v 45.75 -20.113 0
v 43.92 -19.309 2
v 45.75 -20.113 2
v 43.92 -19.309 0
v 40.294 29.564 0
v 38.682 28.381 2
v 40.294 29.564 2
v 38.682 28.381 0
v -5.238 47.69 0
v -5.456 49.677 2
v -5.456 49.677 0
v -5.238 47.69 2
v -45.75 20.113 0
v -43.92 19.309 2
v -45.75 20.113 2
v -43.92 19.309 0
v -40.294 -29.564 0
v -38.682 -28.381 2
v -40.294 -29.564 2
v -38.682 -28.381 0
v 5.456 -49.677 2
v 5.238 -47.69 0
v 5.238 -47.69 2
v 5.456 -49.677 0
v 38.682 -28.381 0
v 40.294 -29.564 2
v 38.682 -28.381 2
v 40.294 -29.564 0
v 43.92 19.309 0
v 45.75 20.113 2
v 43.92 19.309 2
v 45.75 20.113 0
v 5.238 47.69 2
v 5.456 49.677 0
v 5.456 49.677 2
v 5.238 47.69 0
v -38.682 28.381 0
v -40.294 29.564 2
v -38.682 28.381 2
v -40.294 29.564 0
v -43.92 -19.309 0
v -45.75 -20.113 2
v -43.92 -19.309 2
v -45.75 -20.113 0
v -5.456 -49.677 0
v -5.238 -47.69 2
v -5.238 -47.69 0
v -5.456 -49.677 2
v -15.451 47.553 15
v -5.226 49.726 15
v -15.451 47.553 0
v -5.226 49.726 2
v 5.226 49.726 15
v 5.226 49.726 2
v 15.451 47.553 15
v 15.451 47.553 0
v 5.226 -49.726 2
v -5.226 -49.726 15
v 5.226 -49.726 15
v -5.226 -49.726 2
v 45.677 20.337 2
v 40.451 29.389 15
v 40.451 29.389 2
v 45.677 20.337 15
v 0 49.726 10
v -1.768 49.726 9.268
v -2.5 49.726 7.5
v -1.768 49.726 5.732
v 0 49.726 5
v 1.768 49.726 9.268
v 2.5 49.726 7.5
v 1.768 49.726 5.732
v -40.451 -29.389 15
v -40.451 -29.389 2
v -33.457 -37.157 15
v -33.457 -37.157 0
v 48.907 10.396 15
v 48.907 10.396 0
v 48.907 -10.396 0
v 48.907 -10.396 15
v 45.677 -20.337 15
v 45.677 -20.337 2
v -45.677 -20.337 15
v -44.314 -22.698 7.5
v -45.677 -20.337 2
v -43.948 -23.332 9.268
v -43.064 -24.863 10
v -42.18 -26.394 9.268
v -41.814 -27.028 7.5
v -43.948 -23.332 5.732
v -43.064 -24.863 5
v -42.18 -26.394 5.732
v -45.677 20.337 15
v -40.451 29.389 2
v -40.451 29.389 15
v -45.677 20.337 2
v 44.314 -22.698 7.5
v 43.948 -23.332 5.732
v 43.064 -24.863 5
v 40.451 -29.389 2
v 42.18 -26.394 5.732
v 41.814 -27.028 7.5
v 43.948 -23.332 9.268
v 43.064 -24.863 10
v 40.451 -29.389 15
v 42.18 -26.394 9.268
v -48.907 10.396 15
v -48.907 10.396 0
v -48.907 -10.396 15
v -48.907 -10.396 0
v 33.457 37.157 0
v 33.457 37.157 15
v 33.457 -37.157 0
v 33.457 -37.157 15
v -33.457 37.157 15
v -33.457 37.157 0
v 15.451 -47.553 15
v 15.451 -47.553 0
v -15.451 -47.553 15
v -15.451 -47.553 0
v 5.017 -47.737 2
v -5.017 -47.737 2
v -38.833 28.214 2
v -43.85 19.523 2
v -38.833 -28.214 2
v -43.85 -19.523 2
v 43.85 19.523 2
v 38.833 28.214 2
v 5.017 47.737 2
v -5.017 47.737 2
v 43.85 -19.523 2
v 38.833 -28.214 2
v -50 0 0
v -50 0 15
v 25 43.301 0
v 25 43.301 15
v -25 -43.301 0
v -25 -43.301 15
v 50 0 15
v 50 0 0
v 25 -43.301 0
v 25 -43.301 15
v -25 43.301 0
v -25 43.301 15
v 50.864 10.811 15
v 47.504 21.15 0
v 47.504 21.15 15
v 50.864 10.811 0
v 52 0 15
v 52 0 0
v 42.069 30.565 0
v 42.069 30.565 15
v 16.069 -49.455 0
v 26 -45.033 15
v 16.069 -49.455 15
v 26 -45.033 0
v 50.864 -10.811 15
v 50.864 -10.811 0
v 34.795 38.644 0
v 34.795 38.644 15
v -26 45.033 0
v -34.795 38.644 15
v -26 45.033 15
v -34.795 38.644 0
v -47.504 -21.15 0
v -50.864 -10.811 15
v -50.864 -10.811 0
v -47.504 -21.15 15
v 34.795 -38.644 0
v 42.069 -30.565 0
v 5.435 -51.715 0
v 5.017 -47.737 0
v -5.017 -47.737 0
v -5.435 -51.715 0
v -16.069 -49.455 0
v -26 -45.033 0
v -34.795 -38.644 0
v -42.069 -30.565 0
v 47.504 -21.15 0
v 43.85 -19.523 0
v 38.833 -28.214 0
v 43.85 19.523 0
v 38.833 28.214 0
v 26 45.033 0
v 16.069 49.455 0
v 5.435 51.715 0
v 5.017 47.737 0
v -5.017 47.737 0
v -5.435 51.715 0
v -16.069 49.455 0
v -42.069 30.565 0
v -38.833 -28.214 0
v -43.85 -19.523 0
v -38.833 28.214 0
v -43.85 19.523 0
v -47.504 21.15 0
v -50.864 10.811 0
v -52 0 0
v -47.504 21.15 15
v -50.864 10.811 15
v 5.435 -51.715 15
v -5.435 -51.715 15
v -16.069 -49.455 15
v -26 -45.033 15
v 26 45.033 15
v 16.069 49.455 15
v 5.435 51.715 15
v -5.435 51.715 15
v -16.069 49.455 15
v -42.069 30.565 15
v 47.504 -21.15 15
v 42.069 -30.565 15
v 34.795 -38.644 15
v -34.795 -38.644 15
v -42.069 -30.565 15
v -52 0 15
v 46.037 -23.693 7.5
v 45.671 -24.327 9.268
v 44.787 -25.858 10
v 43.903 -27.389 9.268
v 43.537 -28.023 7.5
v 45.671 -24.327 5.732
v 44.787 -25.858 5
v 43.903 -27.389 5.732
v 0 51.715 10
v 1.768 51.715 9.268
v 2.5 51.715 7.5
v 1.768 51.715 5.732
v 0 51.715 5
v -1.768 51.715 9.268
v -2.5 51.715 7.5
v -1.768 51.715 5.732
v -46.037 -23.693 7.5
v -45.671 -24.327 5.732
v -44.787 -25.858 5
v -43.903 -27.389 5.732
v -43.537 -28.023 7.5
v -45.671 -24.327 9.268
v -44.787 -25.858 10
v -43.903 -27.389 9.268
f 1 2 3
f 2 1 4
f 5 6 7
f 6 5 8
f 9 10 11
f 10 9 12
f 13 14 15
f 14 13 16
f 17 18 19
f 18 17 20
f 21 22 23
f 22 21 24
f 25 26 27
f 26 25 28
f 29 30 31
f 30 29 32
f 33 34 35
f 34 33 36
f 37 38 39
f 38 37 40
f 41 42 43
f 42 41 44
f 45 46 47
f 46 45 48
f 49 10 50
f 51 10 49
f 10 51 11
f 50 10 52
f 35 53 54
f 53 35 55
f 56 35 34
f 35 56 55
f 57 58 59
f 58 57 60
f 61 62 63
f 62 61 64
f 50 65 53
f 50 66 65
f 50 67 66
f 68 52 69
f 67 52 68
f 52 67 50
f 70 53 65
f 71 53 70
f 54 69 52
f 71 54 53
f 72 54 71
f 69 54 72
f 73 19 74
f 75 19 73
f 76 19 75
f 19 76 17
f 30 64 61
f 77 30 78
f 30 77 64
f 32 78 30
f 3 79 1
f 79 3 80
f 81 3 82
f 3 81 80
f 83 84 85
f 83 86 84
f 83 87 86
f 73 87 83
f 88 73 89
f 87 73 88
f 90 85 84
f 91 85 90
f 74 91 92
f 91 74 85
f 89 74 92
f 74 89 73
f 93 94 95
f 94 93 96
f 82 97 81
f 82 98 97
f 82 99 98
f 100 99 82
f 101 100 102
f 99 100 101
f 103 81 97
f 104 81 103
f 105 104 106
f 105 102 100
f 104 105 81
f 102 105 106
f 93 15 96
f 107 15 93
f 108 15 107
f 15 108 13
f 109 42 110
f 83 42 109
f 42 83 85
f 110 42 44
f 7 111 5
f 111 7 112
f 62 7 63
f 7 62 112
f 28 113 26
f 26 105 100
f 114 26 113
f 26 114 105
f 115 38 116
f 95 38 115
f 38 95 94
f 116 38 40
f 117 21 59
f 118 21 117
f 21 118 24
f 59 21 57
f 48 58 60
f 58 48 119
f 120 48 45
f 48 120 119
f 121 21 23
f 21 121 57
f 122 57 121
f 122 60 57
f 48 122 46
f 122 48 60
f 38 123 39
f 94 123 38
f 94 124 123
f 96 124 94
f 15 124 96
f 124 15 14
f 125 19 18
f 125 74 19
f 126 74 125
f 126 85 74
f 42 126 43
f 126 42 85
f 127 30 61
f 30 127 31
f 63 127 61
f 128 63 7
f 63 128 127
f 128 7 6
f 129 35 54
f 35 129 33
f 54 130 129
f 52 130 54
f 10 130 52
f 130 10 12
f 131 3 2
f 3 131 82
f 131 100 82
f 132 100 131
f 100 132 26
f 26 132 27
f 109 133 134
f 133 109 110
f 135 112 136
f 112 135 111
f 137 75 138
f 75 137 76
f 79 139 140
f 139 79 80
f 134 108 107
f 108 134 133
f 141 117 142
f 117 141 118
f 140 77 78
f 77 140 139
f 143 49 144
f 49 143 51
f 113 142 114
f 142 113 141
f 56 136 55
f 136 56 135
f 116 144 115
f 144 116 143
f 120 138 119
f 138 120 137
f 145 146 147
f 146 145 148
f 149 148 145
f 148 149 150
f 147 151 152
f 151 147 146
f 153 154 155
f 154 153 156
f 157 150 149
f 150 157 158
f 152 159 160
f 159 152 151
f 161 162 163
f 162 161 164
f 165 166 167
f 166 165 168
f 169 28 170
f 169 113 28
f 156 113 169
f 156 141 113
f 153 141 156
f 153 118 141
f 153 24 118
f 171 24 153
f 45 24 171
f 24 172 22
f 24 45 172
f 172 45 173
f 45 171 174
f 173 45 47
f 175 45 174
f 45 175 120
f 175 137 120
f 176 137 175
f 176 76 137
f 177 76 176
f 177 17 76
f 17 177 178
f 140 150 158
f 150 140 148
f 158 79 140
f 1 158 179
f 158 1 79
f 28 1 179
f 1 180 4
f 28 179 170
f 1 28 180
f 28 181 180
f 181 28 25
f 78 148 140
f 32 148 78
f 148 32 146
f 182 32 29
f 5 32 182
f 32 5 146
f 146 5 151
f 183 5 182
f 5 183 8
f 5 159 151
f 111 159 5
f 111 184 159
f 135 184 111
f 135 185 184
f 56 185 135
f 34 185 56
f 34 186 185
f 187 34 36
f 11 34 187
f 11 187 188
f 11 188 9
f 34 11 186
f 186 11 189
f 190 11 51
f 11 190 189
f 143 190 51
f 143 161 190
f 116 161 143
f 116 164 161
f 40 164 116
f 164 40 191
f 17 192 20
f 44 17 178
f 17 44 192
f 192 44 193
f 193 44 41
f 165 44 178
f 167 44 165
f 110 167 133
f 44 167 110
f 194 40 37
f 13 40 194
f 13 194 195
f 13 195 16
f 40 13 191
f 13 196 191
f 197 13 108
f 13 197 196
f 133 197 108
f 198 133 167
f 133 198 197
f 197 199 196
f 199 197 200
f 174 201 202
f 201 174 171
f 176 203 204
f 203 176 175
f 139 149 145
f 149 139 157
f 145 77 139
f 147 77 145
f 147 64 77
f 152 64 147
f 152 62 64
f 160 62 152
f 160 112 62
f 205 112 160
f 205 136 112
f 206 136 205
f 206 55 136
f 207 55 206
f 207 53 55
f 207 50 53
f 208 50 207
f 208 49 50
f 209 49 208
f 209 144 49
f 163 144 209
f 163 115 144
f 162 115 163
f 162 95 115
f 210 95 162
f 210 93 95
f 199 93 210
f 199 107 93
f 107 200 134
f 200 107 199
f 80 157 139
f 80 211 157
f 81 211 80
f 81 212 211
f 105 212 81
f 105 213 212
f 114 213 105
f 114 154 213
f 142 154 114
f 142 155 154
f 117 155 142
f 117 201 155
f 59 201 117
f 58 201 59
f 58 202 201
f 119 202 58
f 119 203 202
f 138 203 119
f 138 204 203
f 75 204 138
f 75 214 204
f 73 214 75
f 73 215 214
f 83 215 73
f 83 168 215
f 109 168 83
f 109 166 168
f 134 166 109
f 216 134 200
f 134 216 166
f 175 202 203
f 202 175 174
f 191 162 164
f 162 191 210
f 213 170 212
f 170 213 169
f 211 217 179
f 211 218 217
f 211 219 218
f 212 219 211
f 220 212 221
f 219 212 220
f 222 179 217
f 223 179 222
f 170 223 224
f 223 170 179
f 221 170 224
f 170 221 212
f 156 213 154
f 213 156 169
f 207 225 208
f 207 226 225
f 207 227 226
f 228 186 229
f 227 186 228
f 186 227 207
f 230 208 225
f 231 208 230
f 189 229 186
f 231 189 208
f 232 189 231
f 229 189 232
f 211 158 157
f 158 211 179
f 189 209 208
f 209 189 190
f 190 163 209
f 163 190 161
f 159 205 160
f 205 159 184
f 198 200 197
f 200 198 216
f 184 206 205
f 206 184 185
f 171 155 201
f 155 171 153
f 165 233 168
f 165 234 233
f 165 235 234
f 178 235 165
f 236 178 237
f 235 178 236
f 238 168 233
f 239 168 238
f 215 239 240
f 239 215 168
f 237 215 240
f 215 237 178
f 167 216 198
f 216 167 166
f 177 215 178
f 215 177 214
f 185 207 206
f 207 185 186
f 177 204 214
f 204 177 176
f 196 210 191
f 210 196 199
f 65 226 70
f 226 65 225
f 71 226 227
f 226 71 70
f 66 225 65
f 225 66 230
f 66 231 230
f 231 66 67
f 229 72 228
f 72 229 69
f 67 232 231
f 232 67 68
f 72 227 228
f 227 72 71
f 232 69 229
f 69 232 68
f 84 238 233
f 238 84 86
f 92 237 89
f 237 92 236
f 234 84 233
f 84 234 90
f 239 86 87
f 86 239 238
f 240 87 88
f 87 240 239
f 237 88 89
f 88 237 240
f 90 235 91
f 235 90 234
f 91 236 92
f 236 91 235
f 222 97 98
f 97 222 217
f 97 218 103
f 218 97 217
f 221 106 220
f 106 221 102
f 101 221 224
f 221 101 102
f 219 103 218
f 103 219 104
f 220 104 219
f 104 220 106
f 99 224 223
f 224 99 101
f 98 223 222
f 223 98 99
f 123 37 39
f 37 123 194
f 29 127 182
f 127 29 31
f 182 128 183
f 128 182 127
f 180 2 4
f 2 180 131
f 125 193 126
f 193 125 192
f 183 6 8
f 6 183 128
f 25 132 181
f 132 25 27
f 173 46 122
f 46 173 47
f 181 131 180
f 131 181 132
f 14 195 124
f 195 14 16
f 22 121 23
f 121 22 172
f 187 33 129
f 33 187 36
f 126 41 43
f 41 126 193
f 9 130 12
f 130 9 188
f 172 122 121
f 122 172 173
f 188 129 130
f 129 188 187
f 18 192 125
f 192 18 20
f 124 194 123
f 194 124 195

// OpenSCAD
baseThick = 2;
baseWidth = 4;
baseOuterDiameter = 104;
baseInnerDiameter = baseOuterDiameter - (baseWidth * 2);

wallHeight = 15;
wallThick = 4;
chamberDiameter = 100;

partHeight = wallHeight;
partWidth = baseOuterDiameter;

use <MCAD/gears.scad>

union() {

    difference() {

        difference() {
            cylinder(h = wallHeight, d = baseOuterDiameter);

            translate([0,0,-1]) {
                difference() {
                    cylinder(h = baseThick + 2, d = baseOuterDiameter - wallThick);

                    difference() {

                        translate([0,0,-1]) {
                            cylinder(h = baseThick + 2, d = baseOuterDiameter - wallThick);
            			}

                        // Remove Gear-Shape from cylinder to form the base teeth
                        translate([0,0,-2]) {
						   rotate(-7, [0,0,1])
                            linear_extrude(height = baseThick + 4) {
                                gear(number_of_teeth=6, circular_pitch=100, clearance = 60, pressure_angle=60);
                            }
						   rotate(7, [0,0,1])
                            linear_extrude(height = baseThick + 4) {
                                gear(number_of_teeth=6, circular_pitch=100, clearance = 60, pressure_angle=60);
                            }
                        }
                    }
                }
            }
        }

        translate([0,0,baseThick]) {
            cylinder(h = wallHeight + 2, d = chamberDiameter);
        }

        translate([0,0,-1]) {
	        cylinder(h = baseThick + 2, d = baseInnerDiameter);
        }

        num = 3;

        for ( i = [0 : num] )
        {
            rotate( i * (360 / num), [0, 0, 1])
            translate([0, 1 + baseOuterDiameter / 2, wallHeight / 2]) {
                rotate( 90, [1, 0, 0])
        	    cylinder(h = baseWidth + 2, d = 5);
        	}
        }
   }
}
